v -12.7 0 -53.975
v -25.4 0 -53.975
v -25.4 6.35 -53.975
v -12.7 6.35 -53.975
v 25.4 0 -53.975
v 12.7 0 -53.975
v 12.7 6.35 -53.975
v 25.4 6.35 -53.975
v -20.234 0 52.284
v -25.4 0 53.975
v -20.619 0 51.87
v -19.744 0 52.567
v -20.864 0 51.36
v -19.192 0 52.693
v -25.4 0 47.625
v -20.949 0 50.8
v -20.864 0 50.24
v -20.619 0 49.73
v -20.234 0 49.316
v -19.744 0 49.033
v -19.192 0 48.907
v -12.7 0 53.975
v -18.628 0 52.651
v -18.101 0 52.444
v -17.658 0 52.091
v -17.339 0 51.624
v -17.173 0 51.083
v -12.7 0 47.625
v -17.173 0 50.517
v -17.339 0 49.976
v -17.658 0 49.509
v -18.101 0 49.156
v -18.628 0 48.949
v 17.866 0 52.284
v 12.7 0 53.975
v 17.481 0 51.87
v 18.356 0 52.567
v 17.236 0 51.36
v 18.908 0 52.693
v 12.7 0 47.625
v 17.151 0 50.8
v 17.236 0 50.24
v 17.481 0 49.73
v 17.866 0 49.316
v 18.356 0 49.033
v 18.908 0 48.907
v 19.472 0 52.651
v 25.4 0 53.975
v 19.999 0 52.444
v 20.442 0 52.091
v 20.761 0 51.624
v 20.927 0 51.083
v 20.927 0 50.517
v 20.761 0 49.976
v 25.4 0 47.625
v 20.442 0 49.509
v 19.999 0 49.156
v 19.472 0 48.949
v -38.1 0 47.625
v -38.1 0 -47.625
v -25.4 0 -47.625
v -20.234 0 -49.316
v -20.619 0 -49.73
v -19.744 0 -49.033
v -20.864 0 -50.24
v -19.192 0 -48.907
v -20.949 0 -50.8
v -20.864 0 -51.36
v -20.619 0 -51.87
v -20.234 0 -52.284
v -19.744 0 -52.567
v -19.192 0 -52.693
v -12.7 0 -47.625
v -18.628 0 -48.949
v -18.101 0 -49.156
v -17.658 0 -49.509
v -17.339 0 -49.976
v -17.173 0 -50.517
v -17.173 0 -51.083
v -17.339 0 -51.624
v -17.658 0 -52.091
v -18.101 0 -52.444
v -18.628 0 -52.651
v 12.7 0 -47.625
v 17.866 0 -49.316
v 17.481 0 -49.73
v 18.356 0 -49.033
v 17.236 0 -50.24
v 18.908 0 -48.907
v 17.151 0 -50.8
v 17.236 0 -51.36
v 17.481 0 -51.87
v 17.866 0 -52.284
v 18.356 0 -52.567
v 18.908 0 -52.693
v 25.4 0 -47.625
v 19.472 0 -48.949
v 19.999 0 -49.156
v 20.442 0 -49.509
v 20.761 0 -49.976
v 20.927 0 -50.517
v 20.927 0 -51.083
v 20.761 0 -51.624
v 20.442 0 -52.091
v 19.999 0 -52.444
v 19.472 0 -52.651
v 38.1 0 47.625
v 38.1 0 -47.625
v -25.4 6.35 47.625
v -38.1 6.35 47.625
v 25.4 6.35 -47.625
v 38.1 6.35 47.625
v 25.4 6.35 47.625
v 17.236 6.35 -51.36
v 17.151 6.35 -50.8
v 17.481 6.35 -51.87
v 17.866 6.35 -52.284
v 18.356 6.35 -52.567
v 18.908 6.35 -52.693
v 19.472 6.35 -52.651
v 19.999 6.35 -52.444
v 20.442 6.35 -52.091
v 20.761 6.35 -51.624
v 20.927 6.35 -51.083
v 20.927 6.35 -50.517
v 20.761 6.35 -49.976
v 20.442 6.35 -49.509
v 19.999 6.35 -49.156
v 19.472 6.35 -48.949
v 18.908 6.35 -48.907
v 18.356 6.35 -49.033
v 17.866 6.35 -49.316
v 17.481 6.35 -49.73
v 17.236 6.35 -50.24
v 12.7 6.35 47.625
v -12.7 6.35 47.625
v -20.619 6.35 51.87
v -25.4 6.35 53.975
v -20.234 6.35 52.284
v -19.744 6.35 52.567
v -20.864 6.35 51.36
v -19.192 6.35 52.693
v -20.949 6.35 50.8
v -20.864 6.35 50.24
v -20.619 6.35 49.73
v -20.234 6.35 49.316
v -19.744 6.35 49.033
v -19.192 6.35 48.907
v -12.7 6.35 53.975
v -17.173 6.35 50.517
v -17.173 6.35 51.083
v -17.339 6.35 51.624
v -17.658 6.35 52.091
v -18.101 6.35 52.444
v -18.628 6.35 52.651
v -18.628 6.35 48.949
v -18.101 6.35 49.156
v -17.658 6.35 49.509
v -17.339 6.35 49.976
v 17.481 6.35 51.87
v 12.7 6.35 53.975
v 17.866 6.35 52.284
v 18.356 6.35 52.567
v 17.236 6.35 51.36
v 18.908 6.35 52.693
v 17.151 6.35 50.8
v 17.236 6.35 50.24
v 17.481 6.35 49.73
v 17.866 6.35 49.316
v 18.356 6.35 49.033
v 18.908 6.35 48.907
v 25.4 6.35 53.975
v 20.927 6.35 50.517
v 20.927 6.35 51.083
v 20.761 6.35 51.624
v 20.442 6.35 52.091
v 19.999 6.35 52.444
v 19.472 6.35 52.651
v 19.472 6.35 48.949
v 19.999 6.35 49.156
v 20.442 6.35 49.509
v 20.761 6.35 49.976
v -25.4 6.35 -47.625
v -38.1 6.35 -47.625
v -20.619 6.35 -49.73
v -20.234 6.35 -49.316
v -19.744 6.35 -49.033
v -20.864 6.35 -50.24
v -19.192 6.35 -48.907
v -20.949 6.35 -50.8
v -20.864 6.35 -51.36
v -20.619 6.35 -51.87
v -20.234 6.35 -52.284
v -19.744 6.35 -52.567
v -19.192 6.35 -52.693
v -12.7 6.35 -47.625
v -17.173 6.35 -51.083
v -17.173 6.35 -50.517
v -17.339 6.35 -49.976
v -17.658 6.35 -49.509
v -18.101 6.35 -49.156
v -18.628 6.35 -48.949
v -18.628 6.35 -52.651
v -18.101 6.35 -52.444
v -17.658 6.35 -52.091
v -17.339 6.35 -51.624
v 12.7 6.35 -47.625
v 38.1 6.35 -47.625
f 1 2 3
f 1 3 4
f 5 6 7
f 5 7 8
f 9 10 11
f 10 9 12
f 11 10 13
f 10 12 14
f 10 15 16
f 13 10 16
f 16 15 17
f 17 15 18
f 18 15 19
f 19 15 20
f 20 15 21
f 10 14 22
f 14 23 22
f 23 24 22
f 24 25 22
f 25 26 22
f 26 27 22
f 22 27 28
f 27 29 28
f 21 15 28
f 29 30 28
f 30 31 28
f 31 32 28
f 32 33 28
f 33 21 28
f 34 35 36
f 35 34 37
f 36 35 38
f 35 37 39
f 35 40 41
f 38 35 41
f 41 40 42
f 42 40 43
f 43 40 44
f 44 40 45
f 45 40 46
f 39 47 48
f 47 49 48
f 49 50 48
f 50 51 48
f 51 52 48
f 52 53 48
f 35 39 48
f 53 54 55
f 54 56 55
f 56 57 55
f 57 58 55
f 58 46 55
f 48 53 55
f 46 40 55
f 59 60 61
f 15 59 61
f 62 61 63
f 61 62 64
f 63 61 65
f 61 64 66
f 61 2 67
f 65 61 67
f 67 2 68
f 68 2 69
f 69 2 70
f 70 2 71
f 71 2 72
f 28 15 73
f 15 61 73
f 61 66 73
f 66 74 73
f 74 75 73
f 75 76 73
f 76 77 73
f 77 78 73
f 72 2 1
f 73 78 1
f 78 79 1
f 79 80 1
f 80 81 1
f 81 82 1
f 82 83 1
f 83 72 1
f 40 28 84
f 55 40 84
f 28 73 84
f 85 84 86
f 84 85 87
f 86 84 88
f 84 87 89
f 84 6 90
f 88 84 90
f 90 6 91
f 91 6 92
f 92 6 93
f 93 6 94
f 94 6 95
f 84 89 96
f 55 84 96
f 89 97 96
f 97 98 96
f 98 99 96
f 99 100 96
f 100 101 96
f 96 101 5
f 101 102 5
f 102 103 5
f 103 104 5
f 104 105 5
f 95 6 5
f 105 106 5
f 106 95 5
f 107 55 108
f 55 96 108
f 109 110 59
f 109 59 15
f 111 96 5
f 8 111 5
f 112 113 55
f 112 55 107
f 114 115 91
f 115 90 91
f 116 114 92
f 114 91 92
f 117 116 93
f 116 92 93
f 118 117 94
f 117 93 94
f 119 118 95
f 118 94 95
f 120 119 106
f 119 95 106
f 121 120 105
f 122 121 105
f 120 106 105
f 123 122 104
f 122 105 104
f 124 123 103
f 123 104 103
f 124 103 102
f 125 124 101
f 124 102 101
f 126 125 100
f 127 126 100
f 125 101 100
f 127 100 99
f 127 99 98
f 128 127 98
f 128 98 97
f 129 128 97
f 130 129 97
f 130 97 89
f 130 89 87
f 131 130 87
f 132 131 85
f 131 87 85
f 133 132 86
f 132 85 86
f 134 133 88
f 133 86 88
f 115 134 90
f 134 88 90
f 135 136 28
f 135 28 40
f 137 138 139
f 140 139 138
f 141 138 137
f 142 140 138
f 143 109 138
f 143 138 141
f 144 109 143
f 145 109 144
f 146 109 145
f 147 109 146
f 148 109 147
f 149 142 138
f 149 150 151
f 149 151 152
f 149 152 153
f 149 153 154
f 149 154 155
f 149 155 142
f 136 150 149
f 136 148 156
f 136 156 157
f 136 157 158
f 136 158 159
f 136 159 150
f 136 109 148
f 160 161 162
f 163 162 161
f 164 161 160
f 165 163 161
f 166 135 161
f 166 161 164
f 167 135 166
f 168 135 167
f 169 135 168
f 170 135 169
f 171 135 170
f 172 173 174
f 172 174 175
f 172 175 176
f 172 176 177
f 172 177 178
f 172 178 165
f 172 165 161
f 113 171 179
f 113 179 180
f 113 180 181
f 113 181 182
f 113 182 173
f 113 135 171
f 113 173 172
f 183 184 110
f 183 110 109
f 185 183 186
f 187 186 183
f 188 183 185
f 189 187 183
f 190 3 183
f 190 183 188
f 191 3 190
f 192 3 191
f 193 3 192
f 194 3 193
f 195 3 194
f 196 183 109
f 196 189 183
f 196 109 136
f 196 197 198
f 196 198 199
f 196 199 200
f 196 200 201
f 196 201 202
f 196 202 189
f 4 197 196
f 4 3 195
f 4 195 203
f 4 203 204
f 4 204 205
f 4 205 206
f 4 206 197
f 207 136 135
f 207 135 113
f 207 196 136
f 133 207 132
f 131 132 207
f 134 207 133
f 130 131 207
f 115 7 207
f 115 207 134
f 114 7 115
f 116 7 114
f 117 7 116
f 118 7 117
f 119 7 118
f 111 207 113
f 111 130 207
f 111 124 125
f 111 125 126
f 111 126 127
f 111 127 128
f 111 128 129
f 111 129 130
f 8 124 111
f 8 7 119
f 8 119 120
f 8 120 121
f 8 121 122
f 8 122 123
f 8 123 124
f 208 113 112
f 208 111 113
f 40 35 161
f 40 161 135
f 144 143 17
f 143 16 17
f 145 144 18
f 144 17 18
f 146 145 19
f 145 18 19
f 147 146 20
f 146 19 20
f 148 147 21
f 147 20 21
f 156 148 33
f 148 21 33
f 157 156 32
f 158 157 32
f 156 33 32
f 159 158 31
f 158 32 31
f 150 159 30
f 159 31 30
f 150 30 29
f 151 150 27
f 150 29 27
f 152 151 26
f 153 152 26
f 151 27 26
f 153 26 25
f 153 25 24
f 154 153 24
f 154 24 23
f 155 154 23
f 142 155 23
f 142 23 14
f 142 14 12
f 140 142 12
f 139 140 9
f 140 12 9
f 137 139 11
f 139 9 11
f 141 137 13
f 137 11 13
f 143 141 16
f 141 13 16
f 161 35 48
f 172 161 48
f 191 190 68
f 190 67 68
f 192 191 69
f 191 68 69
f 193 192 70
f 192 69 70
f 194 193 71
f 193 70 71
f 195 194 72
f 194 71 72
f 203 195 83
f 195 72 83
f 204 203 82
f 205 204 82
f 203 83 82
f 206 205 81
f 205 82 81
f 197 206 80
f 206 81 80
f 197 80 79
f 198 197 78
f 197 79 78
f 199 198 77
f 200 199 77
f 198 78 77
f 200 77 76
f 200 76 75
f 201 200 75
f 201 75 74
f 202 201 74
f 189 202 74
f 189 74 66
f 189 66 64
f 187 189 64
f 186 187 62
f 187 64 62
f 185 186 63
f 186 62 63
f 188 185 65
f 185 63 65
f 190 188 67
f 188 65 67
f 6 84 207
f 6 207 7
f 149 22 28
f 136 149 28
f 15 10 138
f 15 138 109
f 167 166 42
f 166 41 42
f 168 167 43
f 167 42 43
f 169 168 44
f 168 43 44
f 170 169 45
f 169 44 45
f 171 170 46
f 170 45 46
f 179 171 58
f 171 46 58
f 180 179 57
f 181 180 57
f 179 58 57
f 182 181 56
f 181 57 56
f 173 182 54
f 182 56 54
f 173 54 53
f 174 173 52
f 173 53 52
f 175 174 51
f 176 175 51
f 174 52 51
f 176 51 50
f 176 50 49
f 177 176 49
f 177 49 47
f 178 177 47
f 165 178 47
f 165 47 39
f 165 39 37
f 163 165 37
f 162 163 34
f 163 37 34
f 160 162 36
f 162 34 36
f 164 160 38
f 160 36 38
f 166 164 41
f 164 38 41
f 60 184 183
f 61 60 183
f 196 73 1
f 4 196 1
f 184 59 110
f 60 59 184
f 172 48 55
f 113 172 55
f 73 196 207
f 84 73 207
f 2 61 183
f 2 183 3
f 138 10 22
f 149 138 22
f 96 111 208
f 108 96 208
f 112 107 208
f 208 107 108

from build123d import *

# Parameters (mm, degrees)
SKETCH1_W                 = 76.2
SKETCH1_H                 = 107.95
BOSS_EXTRUDE1_DEPTH       = 6.35
SKETCH2_R                 = 1.7526
SKETCH2_W                 = 12.7
SKETCH2_H                 = 6.35
SKETCH2_W_2               = 25.4
CUT_EXTRUDE1_DEPTH        = 6.35
F_6_CLEARANCE_HOLE1_D     = 3.7973
F_6_CLEARANCE_HOLE1_DEPTH = 6.35
F_6_CLEARANCE_HOLE1_TIP   = 1.140824014


with BuildPart() as part:
    # Sketch1 → Boss-Extrude1 (new body)
    with BuildSketch(Plane(origin=(0, 0, 0), x_dir=(1, 0, 0), z_dir=(0, 1, 0))):
        Rectangle(SKETCH1_W, SKETCH1_H)
    extrude(amount=BOSS_EXTRUDE1_DEPTH)

    # Sketch2 → Cut-Extrude1 (cut)
    with BuildSketch(Plane(origin=(0, 6.35, 0), x_dir=(1, 0, 0), z_dir=(0, 1, 0))):
        with Locations(Location((-19.05, 50.8, 0), (0, 0, 270))):
            Circle(SKETCH2_R)
        with Locations(Location((19.05, 50.8, 0), (0, 0, 270))):
            Circle(SKETCH2_R)
        with Locations(Location((19.05, -50.8, 0), (0, 0, 90))):
            Circle(SKETCH2_R)
        with Locations(Location((-19.05, -50.8, 0), (0, 0, 90))):
            Circle(SKETCH2_R)
        with Locations((-31.75, 50.8)):
            Rectangle(SKETCH2_W, SKETCH2_H)
        with Locations((0, 50.8)):
            Rectangle(SKETCH2_W_2, SKETCH2_H)
        with Locations((31.75, 50.8)):
            Rectangle(SKETCH2_W, SKETCH2_H)
        with Locations((31.75, -50.8)):
            Rectangle(SKETCH2_W, SKETCH2_H)
        with Locations((0, -50.8)):
            Rectangle(SKETCH2_W_2, SKETCH2_H)
        with Locations((-31.75, -50.8)):
            Rectangle(SKETCH2_W, SKETCH2_H)
    extrude(amount=-CUT_EXTRUDE1_DEPTH, mode=Mode.SUBTRACT)

    # #6 Clearance Hole1
    with Locations(Plane(origin=(0, 6.35, 0), x_dir=(1, 0, 0), z_dir=(0, 1, 0))):
        with Locations((-19.05, 50.8), (19.05, 50.8), (-19.05, -50.8), (19.05, -50.8)):
            Hole(F_6_CLEARANCE_HOLE1_D / 2, depth=F_6_CLEARANCE_HOLE1_DEPTH)
            with Locations((0, 0, -(F_6_CLEARANCE_HOLE1_DEPTH + F_6_CLEARANCE_HOLE1_TIP / 2))):  # 118° drill point
                Cone(0, F_6_CLEARANCE_HOLE1_D / 2, F_6_CLEARANCE_HOLE1_TIP, mode=Mode.SUBTRACT)


solid = part.part
